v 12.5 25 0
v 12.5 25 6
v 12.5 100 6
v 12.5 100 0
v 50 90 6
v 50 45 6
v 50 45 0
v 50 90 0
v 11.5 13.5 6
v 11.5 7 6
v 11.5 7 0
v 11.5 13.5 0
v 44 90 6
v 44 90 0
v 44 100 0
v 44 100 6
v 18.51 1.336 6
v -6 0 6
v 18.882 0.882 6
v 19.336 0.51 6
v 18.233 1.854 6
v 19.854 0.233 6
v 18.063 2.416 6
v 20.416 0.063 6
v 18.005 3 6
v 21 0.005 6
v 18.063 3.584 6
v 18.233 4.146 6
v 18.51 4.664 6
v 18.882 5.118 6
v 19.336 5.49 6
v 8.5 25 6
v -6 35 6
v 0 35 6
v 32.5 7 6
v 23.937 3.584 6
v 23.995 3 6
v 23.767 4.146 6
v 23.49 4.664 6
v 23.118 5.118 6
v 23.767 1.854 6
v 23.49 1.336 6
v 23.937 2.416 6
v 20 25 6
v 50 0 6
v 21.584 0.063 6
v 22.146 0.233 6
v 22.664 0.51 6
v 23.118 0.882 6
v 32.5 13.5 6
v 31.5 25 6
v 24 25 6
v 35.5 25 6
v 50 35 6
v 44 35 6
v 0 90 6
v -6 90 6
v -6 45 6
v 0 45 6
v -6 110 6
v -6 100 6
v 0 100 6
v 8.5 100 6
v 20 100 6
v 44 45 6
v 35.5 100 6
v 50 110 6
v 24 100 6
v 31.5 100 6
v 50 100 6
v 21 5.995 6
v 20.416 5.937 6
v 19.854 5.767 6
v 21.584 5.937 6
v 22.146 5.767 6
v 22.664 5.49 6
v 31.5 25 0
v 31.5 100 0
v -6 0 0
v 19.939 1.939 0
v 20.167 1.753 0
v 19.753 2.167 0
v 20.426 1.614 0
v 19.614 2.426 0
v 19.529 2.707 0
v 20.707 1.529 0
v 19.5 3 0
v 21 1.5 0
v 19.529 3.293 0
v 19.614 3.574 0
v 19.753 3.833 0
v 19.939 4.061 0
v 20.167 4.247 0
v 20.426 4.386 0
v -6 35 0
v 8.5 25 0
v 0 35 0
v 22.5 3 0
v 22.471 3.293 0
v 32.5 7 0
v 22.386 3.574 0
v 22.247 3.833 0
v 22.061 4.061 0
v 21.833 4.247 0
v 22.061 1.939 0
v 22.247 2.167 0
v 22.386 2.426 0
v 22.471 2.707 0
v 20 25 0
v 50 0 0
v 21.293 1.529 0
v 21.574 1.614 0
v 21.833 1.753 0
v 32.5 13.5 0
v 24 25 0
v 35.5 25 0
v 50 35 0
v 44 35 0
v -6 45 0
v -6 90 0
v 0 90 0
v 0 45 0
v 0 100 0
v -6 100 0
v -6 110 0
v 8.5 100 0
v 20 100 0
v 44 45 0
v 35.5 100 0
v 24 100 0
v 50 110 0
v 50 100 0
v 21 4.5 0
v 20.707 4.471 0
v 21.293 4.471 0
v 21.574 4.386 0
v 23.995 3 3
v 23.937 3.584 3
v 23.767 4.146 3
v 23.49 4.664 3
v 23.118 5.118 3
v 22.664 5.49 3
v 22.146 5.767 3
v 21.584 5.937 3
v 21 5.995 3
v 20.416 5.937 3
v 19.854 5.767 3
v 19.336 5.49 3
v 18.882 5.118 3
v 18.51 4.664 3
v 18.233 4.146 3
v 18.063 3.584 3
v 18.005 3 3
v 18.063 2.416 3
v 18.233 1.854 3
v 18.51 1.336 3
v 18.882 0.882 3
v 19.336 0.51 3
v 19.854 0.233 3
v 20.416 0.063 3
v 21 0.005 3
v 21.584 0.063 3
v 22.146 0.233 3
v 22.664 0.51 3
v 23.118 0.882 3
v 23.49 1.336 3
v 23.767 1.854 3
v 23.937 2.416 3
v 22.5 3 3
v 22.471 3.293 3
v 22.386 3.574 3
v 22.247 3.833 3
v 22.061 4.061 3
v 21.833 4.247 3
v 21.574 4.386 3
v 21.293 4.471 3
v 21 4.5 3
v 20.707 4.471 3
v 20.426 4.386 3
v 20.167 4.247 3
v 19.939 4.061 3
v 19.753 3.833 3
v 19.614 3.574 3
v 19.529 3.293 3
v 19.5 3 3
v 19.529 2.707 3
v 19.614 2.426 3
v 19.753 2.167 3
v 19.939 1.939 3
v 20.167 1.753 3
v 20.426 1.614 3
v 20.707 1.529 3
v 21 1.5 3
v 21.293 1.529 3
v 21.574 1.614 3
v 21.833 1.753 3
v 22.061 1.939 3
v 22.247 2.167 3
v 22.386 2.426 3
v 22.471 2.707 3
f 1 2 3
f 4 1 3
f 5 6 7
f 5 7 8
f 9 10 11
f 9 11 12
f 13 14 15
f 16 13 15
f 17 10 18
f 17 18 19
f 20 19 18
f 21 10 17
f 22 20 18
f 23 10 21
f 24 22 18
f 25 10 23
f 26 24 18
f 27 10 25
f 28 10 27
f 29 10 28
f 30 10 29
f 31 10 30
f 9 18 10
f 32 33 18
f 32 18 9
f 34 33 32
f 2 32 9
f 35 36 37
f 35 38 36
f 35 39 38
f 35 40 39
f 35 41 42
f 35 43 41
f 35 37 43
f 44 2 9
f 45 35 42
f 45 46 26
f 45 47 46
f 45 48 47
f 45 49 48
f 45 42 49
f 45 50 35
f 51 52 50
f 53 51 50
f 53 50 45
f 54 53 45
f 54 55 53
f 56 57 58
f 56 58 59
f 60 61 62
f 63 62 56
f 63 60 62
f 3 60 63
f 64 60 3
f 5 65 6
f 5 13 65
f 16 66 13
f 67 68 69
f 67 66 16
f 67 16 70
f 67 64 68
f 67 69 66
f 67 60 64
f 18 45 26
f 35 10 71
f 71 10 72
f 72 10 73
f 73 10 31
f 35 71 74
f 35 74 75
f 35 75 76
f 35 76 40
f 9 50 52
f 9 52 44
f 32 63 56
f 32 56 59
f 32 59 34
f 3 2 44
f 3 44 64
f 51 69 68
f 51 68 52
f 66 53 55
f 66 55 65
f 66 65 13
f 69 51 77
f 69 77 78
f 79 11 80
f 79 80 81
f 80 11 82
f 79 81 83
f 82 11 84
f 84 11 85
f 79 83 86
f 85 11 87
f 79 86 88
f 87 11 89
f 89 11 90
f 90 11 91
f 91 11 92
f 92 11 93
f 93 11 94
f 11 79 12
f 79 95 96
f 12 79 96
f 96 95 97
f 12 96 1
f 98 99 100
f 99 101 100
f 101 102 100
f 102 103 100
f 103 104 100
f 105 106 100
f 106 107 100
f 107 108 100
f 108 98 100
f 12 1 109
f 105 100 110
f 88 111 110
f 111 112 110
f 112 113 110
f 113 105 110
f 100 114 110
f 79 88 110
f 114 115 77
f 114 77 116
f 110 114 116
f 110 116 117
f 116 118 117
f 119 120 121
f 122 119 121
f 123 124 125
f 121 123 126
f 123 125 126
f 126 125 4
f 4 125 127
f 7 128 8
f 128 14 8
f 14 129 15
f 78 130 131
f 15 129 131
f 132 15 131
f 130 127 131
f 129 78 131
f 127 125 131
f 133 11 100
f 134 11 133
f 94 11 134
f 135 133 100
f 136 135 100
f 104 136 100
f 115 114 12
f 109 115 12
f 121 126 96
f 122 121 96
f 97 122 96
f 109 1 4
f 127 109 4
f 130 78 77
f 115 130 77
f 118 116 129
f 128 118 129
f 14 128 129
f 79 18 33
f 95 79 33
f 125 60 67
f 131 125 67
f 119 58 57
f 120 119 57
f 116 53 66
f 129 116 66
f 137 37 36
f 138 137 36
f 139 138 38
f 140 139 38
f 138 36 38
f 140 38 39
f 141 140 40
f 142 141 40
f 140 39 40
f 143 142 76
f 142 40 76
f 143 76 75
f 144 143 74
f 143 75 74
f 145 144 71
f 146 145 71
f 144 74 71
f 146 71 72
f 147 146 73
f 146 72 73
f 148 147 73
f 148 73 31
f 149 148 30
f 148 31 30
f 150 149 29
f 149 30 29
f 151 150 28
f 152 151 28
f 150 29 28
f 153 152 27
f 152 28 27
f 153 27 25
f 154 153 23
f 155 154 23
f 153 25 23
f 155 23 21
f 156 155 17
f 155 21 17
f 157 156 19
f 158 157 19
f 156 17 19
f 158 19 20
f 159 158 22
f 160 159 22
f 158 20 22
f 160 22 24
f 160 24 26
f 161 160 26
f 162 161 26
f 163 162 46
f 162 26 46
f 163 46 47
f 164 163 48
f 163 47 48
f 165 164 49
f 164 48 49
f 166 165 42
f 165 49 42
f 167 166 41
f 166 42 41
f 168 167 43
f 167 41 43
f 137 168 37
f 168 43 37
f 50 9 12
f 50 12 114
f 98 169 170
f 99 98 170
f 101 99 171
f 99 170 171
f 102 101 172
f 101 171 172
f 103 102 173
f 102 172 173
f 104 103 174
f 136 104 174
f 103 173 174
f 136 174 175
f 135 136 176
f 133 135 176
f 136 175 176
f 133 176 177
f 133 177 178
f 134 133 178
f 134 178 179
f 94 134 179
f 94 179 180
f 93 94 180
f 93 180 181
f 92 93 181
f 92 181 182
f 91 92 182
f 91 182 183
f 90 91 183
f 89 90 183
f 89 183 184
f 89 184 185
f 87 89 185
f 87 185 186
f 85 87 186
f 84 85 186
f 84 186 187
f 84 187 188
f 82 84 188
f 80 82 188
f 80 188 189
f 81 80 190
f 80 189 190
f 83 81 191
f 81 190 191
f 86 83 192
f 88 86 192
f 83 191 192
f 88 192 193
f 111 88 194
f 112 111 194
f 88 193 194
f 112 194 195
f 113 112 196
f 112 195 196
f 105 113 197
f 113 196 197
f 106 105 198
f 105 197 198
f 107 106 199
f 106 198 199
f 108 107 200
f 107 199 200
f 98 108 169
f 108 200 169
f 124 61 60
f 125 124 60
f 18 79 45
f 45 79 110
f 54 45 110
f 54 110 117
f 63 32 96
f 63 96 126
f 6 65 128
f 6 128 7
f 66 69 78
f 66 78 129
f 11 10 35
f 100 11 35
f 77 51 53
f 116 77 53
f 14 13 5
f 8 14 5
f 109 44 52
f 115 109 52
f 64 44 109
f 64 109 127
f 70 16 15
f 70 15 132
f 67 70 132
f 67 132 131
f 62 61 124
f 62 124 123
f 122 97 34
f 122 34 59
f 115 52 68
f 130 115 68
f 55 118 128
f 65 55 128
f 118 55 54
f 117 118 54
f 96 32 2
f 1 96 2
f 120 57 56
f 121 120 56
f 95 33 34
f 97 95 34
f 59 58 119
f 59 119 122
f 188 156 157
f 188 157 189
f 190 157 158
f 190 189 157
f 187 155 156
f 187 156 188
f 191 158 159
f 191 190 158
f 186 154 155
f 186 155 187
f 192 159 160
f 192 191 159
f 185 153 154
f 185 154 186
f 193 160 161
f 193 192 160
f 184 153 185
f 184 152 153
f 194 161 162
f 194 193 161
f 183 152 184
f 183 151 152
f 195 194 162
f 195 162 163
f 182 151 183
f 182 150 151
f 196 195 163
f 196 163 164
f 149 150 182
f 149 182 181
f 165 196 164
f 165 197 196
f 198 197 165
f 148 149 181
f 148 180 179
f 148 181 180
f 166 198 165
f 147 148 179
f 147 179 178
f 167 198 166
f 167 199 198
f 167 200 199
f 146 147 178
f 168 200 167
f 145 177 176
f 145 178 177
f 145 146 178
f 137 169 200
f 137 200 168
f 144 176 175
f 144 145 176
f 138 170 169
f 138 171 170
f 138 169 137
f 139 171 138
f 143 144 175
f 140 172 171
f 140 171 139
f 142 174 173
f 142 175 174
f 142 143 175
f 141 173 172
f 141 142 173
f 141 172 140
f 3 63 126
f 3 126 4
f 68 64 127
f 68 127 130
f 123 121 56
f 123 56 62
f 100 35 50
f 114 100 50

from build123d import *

# Parameters (mm, degrees)
ESQUISSE1_W             = 44
ESQUISSE1_H             = 110
BOSS_EXTRU_1_DEPTH      = 6
ESQUISSE2_W             = 21
ESQUISSE2_H             = 6.5
ESQUISSE2_W_2           = 4
ESQUISSE2_H_2           = 75
ENL_V_MAT_EXTRU_1_DEPTH = 6
ESQUISSE4_W             = 6
ESQUISSE4_H             = 10
ESQUISSE4_H_2           = 45
ESQUISSE4_H_3           = 35
BOSS_EXTRU_2_DEPTH      = 6
ESQUISSE6_R             = 1.5
ENL_V_MAT_EXTRU_3_DEPTH = 6
ESQUISSE8_R             = 2.995
ENL_V_MAT_EXTRU_4_DEPTH = 3


with BuildPart() as part:
    # Esquisse1 → Boss.-Extru.1 (new body)
    with BuildSketch(Plane.XY):
        with Locations((22, 55)):
            Rectangle(ESQUISSE1_W, ESQUISSE1_H)
    extrude(amount=BOSS_EXTRU_1_DEPTH)

    # Esquisse2 → Enlèv. mat.-Extru.1 (cut)
    with BuildSketch(Plane.XY.offset(6)):
        with Locations((22, 10.25)):
            Rectangle(ESQUISSE2_W, ESQUISSE2_H)
        with Locations((22, 62.5)):
            Rectangle(ESQUISSE2_W_2, ESQUISSE2_H_2)
        with Locations((33.5, 62.5)):
            Rectangle(ESQUISSE2_W_2, ESQUISSE2_H_2)
        with Locations((10.5, 62.5)):
            Rectangle(ESQUISSE2_W_2, ESQUISSE2_H_2)
    extrude(amount=-ENL_V_MAT_EXTRU_1_DEPTH, mode=Mode.SUBTRACT)

    # Esquisse4 → Boss.-Extru.2 (add)
    with BuildSketch(Plane.XY.offset(6)):
        with Locations((-3, 105)):
            Rectangle(ESQUISSE4_W, ESQUISSE4_H)
        with Locations((-3, 67.5)):
            Rectangle(ESQUISSE4_W, ESQUISSE4_H_2)
        with Locations((-3, 17.5)):
            Rectangle(ESQUISSE4_W, ESQUISSE4_H_3)
        with Locations((47, 17.5)):
            Rectangle(ESQUISSE4_W, ESQUISSE4_H_3)
        with Locations((47, 67.5)):
            Rectangle(ESQUISSE4_W, ESQUISSE4_H_2)
        with Locations((47, 105)):
            Rectangle(ESQUISSE4_W, ESQUISSE4_H)
    extrude(amount=-BOSS_EXTRU_2_DEPTH)

    # Esquisse6 → Enlèv. mat.-Extru.3 (cut)
    with BuildSketch(Plane.XY.offset(6)):
        with Locations((21, 3)):
            Circle(ESQUISSE6_R)
    extrude(amount=-ENL_V_MAT_EXTRU_3_DEPTH, mode=Mode.SUBTRACT)

    # Esquisse8 → Enlèv. mat.-Extru.4 (cut)
    with BuildSketch(Plane.XY.offset(6)):
        with Locations((21, 3)):
            Circle(ESQUISSE8_R)
    extrude(amount=-ENL_V_MAT_EXTRU_4_DEPTH, mode=Mode.SUBTRACT)


solid = part.part
